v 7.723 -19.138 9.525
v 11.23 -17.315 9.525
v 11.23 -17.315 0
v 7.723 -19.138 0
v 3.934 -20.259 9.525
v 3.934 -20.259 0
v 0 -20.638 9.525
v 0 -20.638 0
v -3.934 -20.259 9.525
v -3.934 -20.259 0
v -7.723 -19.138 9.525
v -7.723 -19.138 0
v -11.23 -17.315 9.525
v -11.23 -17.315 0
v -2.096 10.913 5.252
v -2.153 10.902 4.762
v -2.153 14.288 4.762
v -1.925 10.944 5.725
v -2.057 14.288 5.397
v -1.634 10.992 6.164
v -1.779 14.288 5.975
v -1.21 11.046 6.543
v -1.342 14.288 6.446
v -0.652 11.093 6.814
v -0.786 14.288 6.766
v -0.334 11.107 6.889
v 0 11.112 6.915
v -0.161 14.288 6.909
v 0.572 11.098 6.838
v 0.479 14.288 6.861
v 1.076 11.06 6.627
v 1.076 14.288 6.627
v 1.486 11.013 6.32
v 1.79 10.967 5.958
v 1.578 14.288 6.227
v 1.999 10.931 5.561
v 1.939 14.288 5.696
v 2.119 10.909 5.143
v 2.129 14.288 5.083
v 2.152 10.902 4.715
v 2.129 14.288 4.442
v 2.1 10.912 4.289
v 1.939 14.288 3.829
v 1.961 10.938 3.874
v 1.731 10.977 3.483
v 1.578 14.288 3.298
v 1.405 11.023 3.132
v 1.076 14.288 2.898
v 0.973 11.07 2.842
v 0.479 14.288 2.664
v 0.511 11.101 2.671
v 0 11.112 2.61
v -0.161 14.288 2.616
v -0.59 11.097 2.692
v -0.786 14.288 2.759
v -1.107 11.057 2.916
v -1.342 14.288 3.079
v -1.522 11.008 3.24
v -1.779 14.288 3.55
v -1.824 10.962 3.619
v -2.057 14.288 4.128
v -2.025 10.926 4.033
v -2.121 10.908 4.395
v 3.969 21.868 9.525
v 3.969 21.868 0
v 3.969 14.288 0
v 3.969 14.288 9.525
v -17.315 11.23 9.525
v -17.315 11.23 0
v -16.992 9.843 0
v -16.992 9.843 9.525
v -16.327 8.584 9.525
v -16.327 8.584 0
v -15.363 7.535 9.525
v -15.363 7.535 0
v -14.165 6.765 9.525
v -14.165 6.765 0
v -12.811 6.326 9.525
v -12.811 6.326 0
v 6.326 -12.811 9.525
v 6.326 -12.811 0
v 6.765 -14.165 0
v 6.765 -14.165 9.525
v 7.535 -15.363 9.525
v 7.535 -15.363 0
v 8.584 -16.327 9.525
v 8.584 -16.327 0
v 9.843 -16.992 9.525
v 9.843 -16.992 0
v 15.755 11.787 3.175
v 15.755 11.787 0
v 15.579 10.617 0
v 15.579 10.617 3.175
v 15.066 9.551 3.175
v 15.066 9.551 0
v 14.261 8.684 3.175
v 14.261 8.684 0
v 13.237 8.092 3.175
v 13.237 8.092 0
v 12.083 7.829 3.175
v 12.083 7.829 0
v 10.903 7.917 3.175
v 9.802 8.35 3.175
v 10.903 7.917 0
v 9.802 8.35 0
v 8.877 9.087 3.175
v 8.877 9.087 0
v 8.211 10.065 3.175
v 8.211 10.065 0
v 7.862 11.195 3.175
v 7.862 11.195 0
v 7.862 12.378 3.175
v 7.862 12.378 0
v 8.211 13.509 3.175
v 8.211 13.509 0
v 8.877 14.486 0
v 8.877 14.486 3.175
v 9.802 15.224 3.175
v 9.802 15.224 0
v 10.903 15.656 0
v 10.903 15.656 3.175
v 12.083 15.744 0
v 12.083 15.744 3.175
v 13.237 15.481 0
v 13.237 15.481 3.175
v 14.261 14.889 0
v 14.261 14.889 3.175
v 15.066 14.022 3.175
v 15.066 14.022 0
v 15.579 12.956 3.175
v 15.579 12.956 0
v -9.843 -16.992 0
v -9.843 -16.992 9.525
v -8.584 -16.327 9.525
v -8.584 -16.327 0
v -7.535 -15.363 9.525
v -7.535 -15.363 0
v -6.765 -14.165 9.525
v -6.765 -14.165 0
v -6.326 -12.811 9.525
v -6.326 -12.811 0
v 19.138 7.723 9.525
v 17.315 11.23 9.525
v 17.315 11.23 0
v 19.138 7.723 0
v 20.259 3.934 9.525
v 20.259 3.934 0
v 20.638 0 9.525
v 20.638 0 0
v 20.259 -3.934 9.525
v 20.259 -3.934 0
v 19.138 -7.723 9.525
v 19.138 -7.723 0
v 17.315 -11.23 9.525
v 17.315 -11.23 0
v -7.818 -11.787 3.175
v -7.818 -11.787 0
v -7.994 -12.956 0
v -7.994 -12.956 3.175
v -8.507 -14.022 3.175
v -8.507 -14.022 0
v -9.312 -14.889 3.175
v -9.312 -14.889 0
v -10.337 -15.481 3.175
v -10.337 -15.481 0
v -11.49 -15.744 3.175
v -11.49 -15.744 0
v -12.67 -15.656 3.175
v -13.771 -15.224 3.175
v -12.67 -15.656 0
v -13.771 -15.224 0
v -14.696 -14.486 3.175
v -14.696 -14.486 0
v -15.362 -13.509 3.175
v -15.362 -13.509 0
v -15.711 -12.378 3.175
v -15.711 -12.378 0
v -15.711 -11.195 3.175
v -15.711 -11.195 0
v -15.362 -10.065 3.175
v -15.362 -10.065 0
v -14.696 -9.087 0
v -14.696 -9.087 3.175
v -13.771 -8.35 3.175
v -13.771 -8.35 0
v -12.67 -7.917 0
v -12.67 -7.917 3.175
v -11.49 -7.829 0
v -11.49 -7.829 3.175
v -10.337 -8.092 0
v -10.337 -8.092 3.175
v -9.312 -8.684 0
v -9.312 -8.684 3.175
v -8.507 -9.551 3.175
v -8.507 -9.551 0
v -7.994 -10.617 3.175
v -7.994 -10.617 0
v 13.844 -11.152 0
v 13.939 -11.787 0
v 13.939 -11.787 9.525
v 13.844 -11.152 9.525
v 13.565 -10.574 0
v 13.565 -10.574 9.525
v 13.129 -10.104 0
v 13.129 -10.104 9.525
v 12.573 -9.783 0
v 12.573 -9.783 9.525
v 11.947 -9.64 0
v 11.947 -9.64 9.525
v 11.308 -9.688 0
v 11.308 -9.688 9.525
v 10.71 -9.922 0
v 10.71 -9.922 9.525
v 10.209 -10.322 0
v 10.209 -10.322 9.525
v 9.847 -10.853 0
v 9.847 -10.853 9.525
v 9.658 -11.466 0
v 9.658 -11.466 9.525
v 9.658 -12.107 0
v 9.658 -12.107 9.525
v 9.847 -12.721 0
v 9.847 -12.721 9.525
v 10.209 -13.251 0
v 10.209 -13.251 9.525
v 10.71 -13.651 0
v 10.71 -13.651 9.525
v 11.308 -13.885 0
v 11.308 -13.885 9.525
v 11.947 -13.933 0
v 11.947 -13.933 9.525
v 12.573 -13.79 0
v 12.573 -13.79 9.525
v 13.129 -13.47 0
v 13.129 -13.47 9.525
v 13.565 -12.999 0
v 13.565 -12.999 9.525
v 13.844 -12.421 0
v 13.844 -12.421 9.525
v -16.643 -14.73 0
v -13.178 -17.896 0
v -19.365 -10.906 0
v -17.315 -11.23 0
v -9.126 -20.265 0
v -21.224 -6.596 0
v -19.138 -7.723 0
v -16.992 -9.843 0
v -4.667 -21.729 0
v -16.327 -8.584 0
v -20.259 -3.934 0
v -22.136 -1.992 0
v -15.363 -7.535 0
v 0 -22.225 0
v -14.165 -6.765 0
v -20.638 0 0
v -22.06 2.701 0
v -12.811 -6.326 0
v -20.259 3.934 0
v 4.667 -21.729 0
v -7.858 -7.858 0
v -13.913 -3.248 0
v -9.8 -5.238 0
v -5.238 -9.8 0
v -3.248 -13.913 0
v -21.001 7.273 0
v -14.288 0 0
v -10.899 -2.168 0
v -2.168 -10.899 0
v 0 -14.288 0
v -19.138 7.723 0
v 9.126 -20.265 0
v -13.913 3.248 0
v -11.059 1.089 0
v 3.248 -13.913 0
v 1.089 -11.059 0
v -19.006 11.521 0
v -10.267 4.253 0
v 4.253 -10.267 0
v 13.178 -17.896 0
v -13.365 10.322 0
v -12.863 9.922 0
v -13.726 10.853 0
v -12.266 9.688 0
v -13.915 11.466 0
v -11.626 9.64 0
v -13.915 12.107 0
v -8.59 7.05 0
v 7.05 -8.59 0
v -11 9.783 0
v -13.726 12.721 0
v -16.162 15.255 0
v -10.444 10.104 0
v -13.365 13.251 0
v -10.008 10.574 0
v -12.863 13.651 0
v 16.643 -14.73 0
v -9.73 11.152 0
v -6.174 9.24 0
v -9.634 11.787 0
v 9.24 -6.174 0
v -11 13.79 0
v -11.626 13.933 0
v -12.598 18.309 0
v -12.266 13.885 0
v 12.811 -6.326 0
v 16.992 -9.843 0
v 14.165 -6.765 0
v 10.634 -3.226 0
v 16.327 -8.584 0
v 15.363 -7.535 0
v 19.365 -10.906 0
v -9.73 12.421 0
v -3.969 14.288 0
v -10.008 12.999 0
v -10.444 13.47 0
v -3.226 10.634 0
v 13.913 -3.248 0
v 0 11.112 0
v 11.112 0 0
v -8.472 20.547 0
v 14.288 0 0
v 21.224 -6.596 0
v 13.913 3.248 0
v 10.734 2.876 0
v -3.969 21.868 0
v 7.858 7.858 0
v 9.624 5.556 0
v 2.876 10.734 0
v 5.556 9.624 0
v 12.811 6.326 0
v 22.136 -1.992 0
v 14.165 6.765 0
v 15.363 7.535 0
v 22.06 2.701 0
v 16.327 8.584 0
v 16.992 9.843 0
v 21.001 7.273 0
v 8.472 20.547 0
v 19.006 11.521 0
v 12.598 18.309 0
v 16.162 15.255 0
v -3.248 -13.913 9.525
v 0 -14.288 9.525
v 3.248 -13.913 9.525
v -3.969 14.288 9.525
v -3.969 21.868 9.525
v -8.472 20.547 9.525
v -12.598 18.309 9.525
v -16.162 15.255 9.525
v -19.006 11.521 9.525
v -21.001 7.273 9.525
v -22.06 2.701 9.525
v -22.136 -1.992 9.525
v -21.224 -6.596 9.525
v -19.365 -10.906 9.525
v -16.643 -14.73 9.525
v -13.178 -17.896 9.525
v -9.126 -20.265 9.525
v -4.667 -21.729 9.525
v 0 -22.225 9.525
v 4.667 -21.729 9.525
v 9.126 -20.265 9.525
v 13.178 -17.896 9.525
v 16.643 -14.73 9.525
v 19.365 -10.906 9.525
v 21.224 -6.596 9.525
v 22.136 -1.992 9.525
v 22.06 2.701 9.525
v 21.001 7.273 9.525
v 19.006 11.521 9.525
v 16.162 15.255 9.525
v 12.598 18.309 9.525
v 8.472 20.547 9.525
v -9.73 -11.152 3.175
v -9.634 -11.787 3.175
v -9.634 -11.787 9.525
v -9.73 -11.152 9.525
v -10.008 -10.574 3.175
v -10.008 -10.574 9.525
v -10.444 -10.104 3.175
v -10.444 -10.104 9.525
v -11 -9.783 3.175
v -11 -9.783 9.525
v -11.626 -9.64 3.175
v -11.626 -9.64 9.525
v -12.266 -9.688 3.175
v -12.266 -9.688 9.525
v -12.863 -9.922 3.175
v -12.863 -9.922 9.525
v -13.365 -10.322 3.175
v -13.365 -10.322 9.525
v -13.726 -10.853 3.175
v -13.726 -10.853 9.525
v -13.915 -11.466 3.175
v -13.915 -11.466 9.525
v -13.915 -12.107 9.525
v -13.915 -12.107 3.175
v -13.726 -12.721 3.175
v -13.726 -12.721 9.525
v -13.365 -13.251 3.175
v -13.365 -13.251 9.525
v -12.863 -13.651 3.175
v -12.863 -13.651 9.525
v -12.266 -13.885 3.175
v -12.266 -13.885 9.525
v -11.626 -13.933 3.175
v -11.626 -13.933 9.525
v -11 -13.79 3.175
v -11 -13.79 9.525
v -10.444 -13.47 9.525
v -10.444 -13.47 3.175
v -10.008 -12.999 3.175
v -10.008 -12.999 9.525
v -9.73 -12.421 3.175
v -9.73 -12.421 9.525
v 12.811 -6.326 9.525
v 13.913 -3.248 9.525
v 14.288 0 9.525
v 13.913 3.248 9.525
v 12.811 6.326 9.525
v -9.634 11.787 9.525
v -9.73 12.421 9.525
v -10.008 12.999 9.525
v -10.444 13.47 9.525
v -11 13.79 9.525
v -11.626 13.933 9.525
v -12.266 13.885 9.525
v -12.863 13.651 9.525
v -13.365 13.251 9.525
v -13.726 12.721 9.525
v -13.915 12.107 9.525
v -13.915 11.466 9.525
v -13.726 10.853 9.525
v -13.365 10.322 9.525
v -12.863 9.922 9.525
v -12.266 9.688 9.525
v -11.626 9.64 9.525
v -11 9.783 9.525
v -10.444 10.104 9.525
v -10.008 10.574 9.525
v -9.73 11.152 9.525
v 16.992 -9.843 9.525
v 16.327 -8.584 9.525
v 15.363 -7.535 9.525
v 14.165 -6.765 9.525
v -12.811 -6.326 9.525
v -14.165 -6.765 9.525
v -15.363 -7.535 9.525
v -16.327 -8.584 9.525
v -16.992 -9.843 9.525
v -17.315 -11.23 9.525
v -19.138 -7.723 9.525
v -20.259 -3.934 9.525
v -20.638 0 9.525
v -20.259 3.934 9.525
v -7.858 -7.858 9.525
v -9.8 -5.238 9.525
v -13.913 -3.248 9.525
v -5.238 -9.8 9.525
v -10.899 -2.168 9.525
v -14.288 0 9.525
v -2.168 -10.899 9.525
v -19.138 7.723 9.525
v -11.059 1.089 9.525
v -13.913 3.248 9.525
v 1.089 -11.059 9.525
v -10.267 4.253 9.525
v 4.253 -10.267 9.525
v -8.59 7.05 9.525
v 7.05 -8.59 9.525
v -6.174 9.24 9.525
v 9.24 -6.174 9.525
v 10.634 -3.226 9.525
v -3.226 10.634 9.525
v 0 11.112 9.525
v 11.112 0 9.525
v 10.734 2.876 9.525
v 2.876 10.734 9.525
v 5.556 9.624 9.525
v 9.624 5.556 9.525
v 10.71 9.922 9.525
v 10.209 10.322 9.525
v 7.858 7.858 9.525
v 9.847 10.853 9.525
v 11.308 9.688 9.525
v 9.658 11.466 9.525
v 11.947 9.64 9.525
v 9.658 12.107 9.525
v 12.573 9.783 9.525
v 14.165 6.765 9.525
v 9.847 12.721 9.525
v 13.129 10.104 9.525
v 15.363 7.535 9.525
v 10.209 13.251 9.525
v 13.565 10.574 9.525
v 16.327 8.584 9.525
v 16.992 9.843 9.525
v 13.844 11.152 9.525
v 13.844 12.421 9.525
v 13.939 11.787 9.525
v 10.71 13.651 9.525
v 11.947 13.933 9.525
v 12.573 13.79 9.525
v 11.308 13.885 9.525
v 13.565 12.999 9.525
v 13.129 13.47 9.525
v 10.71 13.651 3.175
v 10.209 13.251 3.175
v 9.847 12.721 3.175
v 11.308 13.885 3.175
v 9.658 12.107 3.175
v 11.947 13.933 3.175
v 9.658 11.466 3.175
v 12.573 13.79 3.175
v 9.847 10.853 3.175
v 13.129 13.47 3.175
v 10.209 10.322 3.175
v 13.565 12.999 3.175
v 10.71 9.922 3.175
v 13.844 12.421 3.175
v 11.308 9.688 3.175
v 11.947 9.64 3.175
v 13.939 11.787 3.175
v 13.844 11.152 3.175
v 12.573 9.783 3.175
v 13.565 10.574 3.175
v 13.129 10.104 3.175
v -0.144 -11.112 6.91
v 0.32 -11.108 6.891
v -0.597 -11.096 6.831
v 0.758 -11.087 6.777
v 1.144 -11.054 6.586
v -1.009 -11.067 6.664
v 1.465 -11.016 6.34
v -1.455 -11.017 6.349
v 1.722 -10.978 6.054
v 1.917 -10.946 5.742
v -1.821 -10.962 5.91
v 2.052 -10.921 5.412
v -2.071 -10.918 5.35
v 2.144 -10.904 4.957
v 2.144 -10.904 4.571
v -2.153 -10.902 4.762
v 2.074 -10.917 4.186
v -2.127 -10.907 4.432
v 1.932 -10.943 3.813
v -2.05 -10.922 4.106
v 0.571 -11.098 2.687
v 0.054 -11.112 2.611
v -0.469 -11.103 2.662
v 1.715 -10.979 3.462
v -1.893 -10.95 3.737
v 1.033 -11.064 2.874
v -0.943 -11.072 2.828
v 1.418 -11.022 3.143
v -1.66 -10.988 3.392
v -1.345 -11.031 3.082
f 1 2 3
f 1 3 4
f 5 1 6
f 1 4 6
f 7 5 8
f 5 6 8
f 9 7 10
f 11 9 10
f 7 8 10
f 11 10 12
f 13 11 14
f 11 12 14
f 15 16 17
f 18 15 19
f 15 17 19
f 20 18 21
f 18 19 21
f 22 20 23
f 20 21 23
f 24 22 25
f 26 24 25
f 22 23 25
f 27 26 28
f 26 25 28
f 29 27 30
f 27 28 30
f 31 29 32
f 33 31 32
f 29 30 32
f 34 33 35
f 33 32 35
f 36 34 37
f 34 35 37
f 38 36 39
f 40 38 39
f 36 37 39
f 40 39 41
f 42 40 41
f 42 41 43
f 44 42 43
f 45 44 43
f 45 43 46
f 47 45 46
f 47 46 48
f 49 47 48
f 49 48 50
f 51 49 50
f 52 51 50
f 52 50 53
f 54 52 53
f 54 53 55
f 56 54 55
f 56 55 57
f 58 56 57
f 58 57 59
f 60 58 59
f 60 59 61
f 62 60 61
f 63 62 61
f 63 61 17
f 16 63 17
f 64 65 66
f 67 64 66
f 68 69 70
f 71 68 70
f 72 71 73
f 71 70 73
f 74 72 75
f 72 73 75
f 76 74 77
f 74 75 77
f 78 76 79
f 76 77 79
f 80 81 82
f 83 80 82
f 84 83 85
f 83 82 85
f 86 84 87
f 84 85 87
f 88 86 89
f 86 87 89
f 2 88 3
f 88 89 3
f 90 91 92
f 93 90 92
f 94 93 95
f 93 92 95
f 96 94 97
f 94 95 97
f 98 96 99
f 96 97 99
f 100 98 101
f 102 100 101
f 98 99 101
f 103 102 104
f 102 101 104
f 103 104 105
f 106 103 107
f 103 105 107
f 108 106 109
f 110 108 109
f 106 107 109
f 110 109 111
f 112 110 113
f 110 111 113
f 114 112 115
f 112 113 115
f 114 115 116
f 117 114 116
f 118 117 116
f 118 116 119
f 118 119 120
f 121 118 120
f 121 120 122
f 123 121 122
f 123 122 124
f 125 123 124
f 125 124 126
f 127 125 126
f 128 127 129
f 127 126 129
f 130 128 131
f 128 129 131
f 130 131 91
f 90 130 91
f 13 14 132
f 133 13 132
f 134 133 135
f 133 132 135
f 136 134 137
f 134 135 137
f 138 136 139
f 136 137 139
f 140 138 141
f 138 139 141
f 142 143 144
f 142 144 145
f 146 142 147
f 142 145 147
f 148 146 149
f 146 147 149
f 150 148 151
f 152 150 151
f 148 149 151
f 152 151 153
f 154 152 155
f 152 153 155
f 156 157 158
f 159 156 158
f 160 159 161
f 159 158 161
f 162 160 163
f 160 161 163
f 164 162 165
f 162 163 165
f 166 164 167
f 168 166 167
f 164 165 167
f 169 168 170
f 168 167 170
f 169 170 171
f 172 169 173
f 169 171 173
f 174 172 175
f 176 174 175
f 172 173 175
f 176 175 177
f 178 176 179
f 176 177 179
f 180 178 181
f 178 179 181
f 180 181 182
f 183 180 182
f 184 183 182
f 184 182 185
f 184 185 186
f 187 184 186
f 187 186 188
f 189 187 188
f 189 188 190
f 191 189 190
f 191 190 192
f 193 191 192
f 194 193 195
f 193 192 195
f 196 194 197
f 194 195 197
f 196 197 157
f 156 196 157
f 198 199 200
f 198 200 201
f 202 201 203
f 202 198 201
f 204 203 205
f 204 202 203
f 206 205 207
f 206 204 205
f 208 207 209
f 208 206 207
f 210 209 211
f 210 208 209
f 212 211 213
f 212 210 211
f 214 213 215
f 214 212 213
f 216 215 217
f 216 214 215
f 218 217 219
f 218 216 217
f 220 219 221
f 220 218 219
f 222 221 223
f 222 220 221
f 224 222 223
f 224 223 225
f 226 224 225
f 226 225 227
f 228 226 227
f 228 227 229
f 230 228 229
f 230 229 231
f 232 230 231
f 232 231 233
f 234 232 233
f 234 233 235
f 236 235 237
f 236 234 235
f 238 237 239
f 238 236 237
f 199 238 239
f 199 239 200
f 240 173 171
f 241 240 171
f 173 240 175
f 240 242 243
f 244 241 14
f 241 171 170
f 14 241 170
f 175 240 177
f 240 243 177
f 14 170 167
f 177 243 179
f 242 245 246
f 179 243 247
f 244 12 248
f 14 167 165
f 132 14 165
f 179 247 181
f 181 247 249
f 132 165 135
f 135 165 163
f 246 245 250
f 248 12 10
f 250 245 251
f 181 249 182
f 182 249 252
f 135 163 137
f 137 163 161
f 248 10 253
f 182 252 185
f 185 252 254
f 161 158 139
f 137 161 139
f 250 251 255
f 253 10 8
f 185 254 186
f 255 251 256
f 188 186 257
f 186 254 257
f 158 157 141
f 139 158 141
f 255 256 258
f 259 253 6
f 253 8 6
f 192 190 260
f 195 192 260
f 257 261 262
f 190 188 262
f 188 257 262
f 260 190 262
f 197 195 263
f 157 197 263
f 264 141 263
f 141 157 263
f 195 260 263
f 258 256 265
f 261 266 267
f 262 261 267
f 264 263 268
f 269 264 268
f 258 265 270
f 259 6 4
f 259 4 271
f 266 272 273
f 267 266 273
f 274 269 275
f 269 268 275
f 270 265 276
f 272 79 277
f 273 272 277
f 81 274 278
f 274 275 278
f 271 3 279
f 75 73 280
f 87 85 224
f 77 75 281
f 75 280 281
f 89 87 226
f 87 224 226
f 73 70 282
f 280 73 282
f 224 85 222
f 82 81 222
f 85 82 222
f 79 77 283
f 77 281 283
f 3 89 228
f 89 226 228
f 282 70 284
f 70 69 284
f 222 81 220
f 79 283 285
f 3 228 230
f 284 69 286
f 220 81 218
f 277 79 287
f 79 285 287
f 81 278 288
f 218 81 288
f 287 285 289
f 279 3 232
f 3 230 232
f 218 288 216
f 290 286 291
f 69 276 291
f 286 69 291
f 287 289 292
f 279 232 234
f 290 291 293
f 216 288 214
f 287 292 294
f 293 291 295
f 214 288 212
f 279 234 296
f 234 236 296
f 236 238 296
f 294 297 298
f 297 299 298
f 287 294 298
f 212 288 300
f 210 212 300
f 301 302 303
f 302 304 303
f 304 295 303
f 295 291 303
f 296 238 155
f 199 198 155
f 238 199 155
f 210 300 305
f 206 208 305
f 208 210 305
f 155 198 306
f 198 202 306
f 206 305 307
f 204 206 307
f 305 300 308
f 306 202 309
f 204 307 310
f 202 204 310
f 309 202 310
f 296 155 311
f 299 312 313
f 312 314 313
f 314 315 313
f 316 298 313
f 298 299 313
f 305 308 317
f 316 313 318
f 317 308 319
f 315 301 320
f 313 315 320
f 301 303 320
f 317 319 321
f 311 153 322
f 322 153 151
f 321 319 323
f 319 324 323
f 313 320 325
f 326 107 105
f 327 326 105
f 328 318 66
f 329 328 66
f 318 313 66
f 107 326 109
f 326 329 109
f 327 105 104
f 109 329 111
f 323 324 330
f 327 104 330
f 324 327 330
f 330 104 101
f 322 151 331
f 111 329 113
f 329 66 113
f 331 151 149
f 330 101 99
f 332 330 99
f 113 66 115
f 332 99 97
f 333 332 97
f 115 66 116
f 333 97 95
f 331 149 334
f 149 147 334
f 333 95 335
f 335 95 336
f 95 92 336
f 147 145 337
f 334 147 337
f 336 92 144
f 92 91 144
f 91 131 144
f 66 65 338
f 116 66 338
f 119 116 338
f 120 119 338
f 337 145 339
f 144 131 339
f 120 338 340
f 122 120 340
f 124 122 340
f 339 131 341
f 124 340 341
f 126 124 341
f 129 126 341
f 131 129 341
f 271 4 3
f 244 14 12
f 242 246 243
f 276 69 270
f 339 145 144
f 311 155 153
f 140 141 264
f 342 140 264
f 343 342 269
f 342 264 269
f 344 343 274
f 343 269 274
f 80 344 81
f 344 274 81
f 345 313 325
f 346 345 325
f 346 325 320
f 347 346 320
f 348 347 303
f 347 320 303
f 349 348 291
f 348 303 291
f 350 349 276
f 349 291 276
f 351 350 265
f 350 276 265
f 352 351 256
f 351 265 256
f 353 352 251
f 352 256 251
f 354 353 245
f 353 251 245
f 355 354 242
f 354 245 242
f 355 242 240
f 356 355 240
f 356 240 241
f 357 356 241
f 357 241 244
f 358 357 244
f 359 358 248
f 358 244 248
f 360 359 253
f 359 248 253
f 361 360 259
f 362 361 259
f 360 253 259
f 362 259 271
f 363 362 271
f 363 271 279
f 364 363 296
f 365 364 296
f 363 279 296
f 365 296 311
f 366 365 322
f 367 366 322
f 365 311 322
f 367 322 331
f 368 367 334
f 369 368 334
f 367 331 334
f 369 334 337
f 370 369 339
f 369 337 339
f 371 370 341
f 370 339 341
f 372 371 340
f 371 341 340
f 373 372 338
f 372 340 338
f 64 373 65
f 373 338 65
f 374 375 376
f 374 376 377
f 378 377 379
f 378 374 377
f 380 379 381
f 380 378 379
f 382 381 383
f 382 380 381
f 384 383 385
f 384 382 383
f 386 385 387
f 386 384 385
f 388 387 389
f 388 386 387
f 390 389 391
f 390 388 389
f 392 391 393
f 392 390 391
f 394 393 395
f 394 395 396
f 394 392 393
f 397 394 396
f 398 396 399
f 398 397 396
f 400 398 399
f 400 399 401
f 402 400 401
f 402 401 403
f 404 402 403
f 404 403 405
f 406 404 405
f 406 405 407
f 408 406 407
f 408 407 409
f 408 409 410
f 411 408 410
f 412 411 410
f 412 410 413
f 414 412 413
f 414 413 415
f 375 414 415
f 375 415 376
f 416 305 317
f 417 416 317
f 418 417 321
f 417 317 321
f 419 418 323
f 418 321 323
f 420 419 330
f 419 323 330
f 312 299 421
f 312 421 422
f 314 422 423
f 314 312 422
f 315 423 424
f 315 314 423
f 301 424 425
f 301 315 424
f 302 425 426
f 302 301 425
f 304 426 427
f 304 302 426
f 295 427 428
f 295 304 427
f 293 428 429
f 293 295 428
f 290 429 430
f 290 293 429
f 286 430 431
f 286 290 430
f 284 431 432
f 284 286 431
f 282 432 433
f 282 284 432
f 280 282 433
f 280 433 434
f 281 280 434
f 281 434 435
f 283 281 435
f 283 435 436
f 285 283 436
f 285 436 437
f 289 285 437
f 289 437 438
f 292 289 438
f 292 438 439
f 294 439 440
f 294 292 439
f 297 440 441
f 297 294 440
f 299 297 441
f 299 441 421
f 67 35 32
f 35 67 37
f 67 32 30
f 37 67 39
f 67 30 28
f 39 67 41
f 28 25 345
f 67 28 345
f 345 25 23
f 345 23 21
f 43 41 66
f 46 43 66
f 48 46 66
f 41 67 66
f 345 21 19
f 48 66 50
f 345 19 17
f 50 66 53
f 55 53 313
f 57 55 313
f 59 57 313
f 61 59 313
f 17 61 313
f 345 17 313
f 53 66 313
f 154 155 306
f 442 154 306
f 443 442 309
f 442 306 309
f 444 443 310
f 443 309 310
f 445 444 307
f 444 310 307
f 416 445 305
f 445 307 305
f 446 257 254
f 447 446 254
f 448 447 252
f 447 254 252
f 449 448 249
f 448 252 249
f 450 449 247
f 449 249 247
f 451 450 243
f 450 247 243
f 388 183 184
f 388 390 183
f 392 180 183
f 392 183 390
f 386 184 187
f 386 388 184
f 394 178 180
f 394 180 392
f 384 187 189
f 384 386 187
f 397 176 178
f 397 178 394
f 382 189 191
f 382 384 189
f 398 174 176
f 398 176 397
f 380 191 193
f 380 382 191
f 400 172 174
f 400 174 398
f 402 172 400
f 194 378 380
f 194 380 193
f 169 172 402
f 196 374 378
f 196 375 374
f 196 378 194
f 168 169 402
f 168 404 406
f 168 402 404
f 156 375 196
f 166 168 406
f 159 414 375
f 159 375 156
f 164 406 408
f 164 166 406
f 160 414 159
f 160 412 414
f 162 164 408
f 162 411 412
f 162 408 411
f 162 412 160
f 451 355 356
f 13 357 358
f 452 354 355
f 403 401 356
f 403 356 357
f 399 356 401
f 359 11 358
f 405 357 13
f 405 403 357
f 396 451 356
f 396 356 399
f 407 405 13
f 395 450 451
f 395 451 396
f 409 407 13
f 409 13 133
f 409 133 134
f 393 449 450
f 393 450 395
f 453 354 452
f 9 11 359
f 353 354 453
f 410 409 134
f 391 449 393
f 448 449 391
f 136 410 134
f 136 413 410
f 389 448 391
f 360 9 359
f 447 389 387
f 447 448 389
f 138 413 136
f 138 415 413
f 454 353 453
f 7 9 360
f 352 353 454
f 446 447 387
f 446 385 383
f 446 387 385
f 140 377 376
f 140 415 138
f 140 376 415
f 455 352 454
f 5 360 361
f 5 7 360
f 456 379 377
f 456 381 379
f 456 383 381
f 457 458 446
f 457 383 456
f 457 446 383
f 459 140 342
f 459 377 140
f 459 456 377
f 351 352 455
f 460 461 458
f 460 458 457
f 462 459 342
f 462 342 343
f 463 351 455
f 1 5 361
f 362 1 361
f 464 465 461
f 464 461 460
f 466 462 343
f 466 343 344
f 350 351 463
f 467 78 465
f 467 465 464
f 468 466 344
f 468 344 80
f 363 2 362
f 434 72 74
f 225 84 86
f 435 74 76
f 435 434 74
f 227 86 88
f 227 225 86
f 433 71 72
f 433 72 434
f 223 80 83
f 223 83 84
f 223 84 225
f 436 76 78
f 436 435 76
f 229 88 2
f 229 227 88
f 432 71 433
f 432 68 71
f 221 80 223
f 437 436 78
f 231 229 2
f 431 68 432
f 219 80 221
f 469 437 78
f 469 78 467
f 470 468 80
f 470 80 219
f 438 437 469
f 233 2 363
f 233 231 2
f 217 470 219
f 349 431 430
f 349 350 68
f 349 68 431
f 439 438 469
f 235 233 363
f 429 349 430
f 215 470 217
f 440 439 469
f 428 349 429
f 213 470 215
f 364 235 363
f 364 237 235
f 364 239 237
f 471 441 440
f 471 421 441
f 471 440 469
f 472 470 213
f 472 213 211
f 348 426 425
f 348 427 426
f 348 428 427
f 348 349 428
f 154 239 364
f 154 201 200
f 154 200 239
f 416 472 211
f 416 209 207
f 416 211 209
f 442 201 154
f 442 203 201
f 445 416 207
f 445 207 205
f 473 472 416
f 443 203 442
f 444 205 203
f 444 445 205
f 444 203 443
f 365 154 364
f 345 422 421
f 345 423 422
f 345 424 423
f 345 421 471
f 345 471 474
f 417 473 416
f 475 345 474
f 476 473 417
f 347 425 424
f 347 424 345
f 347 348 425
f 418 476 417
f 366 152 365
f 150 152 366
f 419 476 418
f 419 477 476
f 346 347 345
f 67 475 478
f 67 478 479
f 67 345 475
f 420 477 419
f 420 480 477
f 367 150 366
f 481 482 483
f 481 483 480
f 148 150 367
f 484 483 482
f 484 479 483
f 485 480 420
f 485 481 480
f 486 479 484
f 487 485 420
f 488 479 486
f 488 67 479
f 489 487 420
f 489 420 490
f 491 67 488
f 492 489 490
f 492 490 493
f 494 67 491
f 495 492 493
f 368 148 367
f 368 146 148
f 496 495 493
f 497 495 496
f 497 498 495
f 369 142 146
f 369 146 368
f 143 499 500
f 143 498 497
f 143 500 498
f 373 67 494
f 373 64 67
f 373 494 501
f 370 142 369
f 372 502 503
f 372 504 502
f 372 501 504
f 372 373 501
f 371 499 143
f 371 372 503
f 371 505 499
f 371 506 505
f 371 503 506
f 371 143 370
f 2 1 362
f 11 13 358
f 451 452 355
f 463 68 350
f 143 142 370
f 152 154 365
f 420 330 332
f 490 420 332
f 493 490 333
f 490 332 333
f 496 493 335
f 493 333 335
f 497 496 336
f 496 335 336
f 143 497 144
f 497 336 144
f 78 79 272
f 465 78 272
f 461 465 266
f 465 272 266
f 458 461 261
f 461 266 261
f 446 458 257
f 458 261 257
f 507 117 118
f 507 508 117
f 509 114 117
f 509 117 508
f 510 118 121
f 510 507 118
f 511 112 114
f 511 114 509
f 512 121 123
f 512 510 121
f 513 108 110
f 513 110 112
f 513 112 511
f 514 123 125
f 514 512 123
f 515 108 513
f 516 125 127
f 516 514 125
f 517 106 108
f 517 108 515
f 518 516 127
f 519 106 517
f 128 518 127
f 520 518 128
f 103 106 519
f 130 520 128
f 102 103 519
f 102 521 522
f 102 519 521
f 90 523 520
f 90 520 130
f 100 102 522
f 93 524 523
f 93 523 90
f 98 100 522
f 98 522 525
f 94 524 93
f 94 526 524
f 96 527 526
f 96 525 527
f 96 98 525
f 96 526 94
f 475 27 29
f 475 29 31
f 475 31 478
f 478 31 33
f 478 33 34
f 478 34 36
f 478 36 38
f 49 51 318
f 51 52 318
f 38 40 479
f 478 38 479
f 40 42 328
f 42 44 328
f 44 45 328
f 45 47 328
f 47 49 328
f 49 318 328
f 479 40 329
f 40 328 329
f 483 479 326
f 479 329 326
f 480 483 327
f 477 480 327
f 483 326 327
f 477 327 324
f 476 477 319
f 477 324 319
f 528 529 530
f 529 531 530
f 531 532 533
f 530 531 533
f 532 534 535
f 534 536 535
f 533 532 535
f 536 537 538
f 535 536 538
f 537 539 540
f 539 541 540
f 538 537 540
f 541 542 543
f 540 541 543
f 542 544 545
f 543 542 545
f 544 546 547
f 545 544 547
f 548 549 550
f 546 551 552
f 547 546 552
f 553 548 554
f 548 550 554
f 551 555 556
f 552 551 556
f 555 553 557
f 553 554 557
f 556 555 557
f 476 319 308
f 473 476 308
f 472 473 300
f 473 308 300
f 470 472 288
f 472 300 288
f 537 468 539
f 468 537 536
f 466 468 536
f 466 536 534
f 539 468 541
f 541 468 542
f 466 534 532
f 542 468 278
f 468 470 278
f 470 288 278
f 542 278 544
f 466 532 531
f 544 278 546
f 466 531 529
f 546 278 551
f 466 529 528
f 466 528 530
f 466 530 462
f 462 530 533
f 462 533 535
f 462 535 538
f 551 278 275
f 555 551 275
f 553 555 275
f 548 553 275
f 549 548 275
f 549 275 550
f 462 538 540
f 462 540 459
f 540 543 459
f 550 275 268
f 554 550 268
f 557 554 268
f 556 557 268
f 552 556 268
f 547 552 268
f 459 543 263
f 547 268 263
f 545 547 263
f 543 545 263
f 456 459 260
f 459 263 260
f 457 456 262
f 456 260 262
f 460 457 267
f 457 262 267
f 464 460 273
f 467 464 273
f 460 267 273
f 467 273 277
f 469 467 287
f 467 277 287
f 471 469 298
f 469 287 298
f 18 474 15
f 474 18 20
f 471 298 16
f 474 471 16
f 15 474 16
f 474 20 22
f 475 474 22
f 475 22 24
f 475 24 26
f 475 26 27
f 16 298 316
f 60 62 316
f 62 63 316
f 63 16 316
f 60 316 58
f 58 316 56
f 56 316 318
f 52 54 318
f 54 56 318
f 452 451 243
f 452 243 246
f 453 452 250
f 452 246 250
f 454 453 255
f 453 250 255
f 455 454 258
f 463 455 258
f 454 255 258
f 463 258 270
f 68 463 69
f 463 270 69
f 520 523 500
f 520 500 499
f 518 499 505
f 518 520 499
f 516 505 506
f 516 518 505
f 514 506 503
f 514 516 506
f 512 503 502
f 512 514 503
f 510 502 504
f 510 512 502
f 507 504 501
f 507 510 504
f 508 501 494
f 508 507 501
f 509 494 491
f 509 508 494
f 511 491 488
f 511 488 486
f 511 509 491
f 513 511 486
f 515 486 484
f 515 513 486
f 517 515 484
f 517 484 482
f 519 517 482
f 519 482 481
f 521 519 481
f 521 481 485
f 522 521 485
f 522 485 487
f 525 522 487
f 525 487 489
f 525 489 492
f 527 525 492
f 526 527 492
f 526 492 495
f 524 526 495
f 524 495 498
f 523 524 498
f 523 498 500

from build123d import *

# Parameters (mm, degrees)
F0_R            = 2.15265
F1_DEPTH        = 9.525
F2_R            = 2.15265
F3_REACH        = 42.6021136501
F5_R            = 3.96875
F6_DEPTH        = 3.175
F8_DEPTH        = 9.525
F8_COPIES_COUNT = 3
F8_COPIES_ANGLE = 180


# Not quite as in the source:
# - a pattern or mirror of a feature is missing from the dataset's text; its kind, count and spacing are read off the source's solid


with BuildPart() as f1:
    # F0 (on Top) → F1 (new body)
    with BuildSketch(Plane.XY):
        with BuildLine():
            Line((3.96875, 14.2875), (0, 14.2875))
            Line((0, 14.2875), (-3.96875, 14.2875))
            Line((-3.96875, 14.2875), (-3.96875, 21.8677764859))
            ThreePointArc((-3.96875, 21.8677764859), (0, -22.225), (3.96875, 21.8677764859))
            Line((3.96875, 21.8677764859), (3.96875, 14.2875))
        make_face()
        with Locations((-11.7865861589, -11.7865861589)):
            Circle(F0_R, mode=Mode.SUBTRACT)
        with Locations((11.7865861589, -11.7865861589)):
            Circle(F0_R, mode=Mode.SUBTRACT)
        with Locations((-11.7865861589, 11.7865861589)):
            Circle(F0_R, mode=Mode.SUBTRACT)
        with BuildLine():
            ThreePointArc((0, 11.1125), (7.8577241059, 7.8577241059), (11.1125, 0))
            ThreePointArc((11.1125, 0), (-7.8577241059, -7.8577241059), (0, 11.1125))
        make_face(mode=Mode.SUBTRACT)
        with Locations((11.7865861589, 11.7865861589)):
            Circle(F0_R, mode=Mode.SUBTRACT)
    extrude(amount=F1_DEPTH)

    f3_end = f1.faces().sort_by_distance((0, -11.1125, 4.7625))[0]
    # F2 (on face) → F3 (cut, up to a face of the model that its end follows)
    with BuildSketch(Plane(origin=(0, 14.2875, 0), x_dir=(-1, 0, 0), z_dir=(0, 1, 0))):
        with Locations((0, 4.7625)):
            Circle(F2_R)
    f3_long = extrude(amount=-F3_REACH, mode=Mode.PRIVATE)
    add(split(f3_long, bisect_by=f3_end, keep=Keep.ALL, mode=Mode.PRIVATE).solids().sort_by_distance((0, 14.2875, 4.7625))[0], mode=Mode.SUBTRACT)

    # F5 (on face) → F6 (cut, through all)
    with BuildSketch(Plane(origin=(0, 0, 0), x_dir=(1, 0, 0), z_dir=(0, 0, -1))):
        with Locations((11.7865861589, -11.7865861589)):
            Circle(F5_R)
        with Locations((-11.7865861589, 11.7865861589)):
            Circle(F5_R)
    extrude(amount=-F6_DEPTH, mode=Mode.SUBTRACT)

    # F7 (on face) → F8 (cut, through all)
    with BuildSketch(Plane(origin=(0, 0, 0), x_dir=(1, 0, 0), z_dir=(0, 0, -1))):
        with BuildLine():
            ThreePointArc((-17.3148424047, -11.229543123), (-15.8788163052, -8.0281867), (-12.8109235396, -6.3255746232))
            ThreePointArc((-12.8109235396, -6.3255746232), (-14.2875, 0), (-12.8109235396, 6.3255746232))
            ThreePointArc((-12.8109235396, 6.3255746232), (-15.8788163052, 8.0281867), (-17.3148424047, 11.229543123))
            ThreePointArc((-17.3148424047, 11.229543123), (-20.6375, 0), (-17.3148424047, -11.229543123))
        make_face()
    f8 = extrude(amount=-F8_DEPTH, mode=Mode.SUBTRACT)

    # F8_copies: F8 ×3 about axis
    f8_copies_axis = Axis((0, 0, 0), (0, 0, 1))
    for i in range(1, F8_COPIES_COUNT):
        add(f8.rotate(f8_copies_axis, i * F8_COPIES_ANGLE / (F8_COPIES_COUNT - 1)), mode=Mode.SUBTRACT)


solid = f1.part
